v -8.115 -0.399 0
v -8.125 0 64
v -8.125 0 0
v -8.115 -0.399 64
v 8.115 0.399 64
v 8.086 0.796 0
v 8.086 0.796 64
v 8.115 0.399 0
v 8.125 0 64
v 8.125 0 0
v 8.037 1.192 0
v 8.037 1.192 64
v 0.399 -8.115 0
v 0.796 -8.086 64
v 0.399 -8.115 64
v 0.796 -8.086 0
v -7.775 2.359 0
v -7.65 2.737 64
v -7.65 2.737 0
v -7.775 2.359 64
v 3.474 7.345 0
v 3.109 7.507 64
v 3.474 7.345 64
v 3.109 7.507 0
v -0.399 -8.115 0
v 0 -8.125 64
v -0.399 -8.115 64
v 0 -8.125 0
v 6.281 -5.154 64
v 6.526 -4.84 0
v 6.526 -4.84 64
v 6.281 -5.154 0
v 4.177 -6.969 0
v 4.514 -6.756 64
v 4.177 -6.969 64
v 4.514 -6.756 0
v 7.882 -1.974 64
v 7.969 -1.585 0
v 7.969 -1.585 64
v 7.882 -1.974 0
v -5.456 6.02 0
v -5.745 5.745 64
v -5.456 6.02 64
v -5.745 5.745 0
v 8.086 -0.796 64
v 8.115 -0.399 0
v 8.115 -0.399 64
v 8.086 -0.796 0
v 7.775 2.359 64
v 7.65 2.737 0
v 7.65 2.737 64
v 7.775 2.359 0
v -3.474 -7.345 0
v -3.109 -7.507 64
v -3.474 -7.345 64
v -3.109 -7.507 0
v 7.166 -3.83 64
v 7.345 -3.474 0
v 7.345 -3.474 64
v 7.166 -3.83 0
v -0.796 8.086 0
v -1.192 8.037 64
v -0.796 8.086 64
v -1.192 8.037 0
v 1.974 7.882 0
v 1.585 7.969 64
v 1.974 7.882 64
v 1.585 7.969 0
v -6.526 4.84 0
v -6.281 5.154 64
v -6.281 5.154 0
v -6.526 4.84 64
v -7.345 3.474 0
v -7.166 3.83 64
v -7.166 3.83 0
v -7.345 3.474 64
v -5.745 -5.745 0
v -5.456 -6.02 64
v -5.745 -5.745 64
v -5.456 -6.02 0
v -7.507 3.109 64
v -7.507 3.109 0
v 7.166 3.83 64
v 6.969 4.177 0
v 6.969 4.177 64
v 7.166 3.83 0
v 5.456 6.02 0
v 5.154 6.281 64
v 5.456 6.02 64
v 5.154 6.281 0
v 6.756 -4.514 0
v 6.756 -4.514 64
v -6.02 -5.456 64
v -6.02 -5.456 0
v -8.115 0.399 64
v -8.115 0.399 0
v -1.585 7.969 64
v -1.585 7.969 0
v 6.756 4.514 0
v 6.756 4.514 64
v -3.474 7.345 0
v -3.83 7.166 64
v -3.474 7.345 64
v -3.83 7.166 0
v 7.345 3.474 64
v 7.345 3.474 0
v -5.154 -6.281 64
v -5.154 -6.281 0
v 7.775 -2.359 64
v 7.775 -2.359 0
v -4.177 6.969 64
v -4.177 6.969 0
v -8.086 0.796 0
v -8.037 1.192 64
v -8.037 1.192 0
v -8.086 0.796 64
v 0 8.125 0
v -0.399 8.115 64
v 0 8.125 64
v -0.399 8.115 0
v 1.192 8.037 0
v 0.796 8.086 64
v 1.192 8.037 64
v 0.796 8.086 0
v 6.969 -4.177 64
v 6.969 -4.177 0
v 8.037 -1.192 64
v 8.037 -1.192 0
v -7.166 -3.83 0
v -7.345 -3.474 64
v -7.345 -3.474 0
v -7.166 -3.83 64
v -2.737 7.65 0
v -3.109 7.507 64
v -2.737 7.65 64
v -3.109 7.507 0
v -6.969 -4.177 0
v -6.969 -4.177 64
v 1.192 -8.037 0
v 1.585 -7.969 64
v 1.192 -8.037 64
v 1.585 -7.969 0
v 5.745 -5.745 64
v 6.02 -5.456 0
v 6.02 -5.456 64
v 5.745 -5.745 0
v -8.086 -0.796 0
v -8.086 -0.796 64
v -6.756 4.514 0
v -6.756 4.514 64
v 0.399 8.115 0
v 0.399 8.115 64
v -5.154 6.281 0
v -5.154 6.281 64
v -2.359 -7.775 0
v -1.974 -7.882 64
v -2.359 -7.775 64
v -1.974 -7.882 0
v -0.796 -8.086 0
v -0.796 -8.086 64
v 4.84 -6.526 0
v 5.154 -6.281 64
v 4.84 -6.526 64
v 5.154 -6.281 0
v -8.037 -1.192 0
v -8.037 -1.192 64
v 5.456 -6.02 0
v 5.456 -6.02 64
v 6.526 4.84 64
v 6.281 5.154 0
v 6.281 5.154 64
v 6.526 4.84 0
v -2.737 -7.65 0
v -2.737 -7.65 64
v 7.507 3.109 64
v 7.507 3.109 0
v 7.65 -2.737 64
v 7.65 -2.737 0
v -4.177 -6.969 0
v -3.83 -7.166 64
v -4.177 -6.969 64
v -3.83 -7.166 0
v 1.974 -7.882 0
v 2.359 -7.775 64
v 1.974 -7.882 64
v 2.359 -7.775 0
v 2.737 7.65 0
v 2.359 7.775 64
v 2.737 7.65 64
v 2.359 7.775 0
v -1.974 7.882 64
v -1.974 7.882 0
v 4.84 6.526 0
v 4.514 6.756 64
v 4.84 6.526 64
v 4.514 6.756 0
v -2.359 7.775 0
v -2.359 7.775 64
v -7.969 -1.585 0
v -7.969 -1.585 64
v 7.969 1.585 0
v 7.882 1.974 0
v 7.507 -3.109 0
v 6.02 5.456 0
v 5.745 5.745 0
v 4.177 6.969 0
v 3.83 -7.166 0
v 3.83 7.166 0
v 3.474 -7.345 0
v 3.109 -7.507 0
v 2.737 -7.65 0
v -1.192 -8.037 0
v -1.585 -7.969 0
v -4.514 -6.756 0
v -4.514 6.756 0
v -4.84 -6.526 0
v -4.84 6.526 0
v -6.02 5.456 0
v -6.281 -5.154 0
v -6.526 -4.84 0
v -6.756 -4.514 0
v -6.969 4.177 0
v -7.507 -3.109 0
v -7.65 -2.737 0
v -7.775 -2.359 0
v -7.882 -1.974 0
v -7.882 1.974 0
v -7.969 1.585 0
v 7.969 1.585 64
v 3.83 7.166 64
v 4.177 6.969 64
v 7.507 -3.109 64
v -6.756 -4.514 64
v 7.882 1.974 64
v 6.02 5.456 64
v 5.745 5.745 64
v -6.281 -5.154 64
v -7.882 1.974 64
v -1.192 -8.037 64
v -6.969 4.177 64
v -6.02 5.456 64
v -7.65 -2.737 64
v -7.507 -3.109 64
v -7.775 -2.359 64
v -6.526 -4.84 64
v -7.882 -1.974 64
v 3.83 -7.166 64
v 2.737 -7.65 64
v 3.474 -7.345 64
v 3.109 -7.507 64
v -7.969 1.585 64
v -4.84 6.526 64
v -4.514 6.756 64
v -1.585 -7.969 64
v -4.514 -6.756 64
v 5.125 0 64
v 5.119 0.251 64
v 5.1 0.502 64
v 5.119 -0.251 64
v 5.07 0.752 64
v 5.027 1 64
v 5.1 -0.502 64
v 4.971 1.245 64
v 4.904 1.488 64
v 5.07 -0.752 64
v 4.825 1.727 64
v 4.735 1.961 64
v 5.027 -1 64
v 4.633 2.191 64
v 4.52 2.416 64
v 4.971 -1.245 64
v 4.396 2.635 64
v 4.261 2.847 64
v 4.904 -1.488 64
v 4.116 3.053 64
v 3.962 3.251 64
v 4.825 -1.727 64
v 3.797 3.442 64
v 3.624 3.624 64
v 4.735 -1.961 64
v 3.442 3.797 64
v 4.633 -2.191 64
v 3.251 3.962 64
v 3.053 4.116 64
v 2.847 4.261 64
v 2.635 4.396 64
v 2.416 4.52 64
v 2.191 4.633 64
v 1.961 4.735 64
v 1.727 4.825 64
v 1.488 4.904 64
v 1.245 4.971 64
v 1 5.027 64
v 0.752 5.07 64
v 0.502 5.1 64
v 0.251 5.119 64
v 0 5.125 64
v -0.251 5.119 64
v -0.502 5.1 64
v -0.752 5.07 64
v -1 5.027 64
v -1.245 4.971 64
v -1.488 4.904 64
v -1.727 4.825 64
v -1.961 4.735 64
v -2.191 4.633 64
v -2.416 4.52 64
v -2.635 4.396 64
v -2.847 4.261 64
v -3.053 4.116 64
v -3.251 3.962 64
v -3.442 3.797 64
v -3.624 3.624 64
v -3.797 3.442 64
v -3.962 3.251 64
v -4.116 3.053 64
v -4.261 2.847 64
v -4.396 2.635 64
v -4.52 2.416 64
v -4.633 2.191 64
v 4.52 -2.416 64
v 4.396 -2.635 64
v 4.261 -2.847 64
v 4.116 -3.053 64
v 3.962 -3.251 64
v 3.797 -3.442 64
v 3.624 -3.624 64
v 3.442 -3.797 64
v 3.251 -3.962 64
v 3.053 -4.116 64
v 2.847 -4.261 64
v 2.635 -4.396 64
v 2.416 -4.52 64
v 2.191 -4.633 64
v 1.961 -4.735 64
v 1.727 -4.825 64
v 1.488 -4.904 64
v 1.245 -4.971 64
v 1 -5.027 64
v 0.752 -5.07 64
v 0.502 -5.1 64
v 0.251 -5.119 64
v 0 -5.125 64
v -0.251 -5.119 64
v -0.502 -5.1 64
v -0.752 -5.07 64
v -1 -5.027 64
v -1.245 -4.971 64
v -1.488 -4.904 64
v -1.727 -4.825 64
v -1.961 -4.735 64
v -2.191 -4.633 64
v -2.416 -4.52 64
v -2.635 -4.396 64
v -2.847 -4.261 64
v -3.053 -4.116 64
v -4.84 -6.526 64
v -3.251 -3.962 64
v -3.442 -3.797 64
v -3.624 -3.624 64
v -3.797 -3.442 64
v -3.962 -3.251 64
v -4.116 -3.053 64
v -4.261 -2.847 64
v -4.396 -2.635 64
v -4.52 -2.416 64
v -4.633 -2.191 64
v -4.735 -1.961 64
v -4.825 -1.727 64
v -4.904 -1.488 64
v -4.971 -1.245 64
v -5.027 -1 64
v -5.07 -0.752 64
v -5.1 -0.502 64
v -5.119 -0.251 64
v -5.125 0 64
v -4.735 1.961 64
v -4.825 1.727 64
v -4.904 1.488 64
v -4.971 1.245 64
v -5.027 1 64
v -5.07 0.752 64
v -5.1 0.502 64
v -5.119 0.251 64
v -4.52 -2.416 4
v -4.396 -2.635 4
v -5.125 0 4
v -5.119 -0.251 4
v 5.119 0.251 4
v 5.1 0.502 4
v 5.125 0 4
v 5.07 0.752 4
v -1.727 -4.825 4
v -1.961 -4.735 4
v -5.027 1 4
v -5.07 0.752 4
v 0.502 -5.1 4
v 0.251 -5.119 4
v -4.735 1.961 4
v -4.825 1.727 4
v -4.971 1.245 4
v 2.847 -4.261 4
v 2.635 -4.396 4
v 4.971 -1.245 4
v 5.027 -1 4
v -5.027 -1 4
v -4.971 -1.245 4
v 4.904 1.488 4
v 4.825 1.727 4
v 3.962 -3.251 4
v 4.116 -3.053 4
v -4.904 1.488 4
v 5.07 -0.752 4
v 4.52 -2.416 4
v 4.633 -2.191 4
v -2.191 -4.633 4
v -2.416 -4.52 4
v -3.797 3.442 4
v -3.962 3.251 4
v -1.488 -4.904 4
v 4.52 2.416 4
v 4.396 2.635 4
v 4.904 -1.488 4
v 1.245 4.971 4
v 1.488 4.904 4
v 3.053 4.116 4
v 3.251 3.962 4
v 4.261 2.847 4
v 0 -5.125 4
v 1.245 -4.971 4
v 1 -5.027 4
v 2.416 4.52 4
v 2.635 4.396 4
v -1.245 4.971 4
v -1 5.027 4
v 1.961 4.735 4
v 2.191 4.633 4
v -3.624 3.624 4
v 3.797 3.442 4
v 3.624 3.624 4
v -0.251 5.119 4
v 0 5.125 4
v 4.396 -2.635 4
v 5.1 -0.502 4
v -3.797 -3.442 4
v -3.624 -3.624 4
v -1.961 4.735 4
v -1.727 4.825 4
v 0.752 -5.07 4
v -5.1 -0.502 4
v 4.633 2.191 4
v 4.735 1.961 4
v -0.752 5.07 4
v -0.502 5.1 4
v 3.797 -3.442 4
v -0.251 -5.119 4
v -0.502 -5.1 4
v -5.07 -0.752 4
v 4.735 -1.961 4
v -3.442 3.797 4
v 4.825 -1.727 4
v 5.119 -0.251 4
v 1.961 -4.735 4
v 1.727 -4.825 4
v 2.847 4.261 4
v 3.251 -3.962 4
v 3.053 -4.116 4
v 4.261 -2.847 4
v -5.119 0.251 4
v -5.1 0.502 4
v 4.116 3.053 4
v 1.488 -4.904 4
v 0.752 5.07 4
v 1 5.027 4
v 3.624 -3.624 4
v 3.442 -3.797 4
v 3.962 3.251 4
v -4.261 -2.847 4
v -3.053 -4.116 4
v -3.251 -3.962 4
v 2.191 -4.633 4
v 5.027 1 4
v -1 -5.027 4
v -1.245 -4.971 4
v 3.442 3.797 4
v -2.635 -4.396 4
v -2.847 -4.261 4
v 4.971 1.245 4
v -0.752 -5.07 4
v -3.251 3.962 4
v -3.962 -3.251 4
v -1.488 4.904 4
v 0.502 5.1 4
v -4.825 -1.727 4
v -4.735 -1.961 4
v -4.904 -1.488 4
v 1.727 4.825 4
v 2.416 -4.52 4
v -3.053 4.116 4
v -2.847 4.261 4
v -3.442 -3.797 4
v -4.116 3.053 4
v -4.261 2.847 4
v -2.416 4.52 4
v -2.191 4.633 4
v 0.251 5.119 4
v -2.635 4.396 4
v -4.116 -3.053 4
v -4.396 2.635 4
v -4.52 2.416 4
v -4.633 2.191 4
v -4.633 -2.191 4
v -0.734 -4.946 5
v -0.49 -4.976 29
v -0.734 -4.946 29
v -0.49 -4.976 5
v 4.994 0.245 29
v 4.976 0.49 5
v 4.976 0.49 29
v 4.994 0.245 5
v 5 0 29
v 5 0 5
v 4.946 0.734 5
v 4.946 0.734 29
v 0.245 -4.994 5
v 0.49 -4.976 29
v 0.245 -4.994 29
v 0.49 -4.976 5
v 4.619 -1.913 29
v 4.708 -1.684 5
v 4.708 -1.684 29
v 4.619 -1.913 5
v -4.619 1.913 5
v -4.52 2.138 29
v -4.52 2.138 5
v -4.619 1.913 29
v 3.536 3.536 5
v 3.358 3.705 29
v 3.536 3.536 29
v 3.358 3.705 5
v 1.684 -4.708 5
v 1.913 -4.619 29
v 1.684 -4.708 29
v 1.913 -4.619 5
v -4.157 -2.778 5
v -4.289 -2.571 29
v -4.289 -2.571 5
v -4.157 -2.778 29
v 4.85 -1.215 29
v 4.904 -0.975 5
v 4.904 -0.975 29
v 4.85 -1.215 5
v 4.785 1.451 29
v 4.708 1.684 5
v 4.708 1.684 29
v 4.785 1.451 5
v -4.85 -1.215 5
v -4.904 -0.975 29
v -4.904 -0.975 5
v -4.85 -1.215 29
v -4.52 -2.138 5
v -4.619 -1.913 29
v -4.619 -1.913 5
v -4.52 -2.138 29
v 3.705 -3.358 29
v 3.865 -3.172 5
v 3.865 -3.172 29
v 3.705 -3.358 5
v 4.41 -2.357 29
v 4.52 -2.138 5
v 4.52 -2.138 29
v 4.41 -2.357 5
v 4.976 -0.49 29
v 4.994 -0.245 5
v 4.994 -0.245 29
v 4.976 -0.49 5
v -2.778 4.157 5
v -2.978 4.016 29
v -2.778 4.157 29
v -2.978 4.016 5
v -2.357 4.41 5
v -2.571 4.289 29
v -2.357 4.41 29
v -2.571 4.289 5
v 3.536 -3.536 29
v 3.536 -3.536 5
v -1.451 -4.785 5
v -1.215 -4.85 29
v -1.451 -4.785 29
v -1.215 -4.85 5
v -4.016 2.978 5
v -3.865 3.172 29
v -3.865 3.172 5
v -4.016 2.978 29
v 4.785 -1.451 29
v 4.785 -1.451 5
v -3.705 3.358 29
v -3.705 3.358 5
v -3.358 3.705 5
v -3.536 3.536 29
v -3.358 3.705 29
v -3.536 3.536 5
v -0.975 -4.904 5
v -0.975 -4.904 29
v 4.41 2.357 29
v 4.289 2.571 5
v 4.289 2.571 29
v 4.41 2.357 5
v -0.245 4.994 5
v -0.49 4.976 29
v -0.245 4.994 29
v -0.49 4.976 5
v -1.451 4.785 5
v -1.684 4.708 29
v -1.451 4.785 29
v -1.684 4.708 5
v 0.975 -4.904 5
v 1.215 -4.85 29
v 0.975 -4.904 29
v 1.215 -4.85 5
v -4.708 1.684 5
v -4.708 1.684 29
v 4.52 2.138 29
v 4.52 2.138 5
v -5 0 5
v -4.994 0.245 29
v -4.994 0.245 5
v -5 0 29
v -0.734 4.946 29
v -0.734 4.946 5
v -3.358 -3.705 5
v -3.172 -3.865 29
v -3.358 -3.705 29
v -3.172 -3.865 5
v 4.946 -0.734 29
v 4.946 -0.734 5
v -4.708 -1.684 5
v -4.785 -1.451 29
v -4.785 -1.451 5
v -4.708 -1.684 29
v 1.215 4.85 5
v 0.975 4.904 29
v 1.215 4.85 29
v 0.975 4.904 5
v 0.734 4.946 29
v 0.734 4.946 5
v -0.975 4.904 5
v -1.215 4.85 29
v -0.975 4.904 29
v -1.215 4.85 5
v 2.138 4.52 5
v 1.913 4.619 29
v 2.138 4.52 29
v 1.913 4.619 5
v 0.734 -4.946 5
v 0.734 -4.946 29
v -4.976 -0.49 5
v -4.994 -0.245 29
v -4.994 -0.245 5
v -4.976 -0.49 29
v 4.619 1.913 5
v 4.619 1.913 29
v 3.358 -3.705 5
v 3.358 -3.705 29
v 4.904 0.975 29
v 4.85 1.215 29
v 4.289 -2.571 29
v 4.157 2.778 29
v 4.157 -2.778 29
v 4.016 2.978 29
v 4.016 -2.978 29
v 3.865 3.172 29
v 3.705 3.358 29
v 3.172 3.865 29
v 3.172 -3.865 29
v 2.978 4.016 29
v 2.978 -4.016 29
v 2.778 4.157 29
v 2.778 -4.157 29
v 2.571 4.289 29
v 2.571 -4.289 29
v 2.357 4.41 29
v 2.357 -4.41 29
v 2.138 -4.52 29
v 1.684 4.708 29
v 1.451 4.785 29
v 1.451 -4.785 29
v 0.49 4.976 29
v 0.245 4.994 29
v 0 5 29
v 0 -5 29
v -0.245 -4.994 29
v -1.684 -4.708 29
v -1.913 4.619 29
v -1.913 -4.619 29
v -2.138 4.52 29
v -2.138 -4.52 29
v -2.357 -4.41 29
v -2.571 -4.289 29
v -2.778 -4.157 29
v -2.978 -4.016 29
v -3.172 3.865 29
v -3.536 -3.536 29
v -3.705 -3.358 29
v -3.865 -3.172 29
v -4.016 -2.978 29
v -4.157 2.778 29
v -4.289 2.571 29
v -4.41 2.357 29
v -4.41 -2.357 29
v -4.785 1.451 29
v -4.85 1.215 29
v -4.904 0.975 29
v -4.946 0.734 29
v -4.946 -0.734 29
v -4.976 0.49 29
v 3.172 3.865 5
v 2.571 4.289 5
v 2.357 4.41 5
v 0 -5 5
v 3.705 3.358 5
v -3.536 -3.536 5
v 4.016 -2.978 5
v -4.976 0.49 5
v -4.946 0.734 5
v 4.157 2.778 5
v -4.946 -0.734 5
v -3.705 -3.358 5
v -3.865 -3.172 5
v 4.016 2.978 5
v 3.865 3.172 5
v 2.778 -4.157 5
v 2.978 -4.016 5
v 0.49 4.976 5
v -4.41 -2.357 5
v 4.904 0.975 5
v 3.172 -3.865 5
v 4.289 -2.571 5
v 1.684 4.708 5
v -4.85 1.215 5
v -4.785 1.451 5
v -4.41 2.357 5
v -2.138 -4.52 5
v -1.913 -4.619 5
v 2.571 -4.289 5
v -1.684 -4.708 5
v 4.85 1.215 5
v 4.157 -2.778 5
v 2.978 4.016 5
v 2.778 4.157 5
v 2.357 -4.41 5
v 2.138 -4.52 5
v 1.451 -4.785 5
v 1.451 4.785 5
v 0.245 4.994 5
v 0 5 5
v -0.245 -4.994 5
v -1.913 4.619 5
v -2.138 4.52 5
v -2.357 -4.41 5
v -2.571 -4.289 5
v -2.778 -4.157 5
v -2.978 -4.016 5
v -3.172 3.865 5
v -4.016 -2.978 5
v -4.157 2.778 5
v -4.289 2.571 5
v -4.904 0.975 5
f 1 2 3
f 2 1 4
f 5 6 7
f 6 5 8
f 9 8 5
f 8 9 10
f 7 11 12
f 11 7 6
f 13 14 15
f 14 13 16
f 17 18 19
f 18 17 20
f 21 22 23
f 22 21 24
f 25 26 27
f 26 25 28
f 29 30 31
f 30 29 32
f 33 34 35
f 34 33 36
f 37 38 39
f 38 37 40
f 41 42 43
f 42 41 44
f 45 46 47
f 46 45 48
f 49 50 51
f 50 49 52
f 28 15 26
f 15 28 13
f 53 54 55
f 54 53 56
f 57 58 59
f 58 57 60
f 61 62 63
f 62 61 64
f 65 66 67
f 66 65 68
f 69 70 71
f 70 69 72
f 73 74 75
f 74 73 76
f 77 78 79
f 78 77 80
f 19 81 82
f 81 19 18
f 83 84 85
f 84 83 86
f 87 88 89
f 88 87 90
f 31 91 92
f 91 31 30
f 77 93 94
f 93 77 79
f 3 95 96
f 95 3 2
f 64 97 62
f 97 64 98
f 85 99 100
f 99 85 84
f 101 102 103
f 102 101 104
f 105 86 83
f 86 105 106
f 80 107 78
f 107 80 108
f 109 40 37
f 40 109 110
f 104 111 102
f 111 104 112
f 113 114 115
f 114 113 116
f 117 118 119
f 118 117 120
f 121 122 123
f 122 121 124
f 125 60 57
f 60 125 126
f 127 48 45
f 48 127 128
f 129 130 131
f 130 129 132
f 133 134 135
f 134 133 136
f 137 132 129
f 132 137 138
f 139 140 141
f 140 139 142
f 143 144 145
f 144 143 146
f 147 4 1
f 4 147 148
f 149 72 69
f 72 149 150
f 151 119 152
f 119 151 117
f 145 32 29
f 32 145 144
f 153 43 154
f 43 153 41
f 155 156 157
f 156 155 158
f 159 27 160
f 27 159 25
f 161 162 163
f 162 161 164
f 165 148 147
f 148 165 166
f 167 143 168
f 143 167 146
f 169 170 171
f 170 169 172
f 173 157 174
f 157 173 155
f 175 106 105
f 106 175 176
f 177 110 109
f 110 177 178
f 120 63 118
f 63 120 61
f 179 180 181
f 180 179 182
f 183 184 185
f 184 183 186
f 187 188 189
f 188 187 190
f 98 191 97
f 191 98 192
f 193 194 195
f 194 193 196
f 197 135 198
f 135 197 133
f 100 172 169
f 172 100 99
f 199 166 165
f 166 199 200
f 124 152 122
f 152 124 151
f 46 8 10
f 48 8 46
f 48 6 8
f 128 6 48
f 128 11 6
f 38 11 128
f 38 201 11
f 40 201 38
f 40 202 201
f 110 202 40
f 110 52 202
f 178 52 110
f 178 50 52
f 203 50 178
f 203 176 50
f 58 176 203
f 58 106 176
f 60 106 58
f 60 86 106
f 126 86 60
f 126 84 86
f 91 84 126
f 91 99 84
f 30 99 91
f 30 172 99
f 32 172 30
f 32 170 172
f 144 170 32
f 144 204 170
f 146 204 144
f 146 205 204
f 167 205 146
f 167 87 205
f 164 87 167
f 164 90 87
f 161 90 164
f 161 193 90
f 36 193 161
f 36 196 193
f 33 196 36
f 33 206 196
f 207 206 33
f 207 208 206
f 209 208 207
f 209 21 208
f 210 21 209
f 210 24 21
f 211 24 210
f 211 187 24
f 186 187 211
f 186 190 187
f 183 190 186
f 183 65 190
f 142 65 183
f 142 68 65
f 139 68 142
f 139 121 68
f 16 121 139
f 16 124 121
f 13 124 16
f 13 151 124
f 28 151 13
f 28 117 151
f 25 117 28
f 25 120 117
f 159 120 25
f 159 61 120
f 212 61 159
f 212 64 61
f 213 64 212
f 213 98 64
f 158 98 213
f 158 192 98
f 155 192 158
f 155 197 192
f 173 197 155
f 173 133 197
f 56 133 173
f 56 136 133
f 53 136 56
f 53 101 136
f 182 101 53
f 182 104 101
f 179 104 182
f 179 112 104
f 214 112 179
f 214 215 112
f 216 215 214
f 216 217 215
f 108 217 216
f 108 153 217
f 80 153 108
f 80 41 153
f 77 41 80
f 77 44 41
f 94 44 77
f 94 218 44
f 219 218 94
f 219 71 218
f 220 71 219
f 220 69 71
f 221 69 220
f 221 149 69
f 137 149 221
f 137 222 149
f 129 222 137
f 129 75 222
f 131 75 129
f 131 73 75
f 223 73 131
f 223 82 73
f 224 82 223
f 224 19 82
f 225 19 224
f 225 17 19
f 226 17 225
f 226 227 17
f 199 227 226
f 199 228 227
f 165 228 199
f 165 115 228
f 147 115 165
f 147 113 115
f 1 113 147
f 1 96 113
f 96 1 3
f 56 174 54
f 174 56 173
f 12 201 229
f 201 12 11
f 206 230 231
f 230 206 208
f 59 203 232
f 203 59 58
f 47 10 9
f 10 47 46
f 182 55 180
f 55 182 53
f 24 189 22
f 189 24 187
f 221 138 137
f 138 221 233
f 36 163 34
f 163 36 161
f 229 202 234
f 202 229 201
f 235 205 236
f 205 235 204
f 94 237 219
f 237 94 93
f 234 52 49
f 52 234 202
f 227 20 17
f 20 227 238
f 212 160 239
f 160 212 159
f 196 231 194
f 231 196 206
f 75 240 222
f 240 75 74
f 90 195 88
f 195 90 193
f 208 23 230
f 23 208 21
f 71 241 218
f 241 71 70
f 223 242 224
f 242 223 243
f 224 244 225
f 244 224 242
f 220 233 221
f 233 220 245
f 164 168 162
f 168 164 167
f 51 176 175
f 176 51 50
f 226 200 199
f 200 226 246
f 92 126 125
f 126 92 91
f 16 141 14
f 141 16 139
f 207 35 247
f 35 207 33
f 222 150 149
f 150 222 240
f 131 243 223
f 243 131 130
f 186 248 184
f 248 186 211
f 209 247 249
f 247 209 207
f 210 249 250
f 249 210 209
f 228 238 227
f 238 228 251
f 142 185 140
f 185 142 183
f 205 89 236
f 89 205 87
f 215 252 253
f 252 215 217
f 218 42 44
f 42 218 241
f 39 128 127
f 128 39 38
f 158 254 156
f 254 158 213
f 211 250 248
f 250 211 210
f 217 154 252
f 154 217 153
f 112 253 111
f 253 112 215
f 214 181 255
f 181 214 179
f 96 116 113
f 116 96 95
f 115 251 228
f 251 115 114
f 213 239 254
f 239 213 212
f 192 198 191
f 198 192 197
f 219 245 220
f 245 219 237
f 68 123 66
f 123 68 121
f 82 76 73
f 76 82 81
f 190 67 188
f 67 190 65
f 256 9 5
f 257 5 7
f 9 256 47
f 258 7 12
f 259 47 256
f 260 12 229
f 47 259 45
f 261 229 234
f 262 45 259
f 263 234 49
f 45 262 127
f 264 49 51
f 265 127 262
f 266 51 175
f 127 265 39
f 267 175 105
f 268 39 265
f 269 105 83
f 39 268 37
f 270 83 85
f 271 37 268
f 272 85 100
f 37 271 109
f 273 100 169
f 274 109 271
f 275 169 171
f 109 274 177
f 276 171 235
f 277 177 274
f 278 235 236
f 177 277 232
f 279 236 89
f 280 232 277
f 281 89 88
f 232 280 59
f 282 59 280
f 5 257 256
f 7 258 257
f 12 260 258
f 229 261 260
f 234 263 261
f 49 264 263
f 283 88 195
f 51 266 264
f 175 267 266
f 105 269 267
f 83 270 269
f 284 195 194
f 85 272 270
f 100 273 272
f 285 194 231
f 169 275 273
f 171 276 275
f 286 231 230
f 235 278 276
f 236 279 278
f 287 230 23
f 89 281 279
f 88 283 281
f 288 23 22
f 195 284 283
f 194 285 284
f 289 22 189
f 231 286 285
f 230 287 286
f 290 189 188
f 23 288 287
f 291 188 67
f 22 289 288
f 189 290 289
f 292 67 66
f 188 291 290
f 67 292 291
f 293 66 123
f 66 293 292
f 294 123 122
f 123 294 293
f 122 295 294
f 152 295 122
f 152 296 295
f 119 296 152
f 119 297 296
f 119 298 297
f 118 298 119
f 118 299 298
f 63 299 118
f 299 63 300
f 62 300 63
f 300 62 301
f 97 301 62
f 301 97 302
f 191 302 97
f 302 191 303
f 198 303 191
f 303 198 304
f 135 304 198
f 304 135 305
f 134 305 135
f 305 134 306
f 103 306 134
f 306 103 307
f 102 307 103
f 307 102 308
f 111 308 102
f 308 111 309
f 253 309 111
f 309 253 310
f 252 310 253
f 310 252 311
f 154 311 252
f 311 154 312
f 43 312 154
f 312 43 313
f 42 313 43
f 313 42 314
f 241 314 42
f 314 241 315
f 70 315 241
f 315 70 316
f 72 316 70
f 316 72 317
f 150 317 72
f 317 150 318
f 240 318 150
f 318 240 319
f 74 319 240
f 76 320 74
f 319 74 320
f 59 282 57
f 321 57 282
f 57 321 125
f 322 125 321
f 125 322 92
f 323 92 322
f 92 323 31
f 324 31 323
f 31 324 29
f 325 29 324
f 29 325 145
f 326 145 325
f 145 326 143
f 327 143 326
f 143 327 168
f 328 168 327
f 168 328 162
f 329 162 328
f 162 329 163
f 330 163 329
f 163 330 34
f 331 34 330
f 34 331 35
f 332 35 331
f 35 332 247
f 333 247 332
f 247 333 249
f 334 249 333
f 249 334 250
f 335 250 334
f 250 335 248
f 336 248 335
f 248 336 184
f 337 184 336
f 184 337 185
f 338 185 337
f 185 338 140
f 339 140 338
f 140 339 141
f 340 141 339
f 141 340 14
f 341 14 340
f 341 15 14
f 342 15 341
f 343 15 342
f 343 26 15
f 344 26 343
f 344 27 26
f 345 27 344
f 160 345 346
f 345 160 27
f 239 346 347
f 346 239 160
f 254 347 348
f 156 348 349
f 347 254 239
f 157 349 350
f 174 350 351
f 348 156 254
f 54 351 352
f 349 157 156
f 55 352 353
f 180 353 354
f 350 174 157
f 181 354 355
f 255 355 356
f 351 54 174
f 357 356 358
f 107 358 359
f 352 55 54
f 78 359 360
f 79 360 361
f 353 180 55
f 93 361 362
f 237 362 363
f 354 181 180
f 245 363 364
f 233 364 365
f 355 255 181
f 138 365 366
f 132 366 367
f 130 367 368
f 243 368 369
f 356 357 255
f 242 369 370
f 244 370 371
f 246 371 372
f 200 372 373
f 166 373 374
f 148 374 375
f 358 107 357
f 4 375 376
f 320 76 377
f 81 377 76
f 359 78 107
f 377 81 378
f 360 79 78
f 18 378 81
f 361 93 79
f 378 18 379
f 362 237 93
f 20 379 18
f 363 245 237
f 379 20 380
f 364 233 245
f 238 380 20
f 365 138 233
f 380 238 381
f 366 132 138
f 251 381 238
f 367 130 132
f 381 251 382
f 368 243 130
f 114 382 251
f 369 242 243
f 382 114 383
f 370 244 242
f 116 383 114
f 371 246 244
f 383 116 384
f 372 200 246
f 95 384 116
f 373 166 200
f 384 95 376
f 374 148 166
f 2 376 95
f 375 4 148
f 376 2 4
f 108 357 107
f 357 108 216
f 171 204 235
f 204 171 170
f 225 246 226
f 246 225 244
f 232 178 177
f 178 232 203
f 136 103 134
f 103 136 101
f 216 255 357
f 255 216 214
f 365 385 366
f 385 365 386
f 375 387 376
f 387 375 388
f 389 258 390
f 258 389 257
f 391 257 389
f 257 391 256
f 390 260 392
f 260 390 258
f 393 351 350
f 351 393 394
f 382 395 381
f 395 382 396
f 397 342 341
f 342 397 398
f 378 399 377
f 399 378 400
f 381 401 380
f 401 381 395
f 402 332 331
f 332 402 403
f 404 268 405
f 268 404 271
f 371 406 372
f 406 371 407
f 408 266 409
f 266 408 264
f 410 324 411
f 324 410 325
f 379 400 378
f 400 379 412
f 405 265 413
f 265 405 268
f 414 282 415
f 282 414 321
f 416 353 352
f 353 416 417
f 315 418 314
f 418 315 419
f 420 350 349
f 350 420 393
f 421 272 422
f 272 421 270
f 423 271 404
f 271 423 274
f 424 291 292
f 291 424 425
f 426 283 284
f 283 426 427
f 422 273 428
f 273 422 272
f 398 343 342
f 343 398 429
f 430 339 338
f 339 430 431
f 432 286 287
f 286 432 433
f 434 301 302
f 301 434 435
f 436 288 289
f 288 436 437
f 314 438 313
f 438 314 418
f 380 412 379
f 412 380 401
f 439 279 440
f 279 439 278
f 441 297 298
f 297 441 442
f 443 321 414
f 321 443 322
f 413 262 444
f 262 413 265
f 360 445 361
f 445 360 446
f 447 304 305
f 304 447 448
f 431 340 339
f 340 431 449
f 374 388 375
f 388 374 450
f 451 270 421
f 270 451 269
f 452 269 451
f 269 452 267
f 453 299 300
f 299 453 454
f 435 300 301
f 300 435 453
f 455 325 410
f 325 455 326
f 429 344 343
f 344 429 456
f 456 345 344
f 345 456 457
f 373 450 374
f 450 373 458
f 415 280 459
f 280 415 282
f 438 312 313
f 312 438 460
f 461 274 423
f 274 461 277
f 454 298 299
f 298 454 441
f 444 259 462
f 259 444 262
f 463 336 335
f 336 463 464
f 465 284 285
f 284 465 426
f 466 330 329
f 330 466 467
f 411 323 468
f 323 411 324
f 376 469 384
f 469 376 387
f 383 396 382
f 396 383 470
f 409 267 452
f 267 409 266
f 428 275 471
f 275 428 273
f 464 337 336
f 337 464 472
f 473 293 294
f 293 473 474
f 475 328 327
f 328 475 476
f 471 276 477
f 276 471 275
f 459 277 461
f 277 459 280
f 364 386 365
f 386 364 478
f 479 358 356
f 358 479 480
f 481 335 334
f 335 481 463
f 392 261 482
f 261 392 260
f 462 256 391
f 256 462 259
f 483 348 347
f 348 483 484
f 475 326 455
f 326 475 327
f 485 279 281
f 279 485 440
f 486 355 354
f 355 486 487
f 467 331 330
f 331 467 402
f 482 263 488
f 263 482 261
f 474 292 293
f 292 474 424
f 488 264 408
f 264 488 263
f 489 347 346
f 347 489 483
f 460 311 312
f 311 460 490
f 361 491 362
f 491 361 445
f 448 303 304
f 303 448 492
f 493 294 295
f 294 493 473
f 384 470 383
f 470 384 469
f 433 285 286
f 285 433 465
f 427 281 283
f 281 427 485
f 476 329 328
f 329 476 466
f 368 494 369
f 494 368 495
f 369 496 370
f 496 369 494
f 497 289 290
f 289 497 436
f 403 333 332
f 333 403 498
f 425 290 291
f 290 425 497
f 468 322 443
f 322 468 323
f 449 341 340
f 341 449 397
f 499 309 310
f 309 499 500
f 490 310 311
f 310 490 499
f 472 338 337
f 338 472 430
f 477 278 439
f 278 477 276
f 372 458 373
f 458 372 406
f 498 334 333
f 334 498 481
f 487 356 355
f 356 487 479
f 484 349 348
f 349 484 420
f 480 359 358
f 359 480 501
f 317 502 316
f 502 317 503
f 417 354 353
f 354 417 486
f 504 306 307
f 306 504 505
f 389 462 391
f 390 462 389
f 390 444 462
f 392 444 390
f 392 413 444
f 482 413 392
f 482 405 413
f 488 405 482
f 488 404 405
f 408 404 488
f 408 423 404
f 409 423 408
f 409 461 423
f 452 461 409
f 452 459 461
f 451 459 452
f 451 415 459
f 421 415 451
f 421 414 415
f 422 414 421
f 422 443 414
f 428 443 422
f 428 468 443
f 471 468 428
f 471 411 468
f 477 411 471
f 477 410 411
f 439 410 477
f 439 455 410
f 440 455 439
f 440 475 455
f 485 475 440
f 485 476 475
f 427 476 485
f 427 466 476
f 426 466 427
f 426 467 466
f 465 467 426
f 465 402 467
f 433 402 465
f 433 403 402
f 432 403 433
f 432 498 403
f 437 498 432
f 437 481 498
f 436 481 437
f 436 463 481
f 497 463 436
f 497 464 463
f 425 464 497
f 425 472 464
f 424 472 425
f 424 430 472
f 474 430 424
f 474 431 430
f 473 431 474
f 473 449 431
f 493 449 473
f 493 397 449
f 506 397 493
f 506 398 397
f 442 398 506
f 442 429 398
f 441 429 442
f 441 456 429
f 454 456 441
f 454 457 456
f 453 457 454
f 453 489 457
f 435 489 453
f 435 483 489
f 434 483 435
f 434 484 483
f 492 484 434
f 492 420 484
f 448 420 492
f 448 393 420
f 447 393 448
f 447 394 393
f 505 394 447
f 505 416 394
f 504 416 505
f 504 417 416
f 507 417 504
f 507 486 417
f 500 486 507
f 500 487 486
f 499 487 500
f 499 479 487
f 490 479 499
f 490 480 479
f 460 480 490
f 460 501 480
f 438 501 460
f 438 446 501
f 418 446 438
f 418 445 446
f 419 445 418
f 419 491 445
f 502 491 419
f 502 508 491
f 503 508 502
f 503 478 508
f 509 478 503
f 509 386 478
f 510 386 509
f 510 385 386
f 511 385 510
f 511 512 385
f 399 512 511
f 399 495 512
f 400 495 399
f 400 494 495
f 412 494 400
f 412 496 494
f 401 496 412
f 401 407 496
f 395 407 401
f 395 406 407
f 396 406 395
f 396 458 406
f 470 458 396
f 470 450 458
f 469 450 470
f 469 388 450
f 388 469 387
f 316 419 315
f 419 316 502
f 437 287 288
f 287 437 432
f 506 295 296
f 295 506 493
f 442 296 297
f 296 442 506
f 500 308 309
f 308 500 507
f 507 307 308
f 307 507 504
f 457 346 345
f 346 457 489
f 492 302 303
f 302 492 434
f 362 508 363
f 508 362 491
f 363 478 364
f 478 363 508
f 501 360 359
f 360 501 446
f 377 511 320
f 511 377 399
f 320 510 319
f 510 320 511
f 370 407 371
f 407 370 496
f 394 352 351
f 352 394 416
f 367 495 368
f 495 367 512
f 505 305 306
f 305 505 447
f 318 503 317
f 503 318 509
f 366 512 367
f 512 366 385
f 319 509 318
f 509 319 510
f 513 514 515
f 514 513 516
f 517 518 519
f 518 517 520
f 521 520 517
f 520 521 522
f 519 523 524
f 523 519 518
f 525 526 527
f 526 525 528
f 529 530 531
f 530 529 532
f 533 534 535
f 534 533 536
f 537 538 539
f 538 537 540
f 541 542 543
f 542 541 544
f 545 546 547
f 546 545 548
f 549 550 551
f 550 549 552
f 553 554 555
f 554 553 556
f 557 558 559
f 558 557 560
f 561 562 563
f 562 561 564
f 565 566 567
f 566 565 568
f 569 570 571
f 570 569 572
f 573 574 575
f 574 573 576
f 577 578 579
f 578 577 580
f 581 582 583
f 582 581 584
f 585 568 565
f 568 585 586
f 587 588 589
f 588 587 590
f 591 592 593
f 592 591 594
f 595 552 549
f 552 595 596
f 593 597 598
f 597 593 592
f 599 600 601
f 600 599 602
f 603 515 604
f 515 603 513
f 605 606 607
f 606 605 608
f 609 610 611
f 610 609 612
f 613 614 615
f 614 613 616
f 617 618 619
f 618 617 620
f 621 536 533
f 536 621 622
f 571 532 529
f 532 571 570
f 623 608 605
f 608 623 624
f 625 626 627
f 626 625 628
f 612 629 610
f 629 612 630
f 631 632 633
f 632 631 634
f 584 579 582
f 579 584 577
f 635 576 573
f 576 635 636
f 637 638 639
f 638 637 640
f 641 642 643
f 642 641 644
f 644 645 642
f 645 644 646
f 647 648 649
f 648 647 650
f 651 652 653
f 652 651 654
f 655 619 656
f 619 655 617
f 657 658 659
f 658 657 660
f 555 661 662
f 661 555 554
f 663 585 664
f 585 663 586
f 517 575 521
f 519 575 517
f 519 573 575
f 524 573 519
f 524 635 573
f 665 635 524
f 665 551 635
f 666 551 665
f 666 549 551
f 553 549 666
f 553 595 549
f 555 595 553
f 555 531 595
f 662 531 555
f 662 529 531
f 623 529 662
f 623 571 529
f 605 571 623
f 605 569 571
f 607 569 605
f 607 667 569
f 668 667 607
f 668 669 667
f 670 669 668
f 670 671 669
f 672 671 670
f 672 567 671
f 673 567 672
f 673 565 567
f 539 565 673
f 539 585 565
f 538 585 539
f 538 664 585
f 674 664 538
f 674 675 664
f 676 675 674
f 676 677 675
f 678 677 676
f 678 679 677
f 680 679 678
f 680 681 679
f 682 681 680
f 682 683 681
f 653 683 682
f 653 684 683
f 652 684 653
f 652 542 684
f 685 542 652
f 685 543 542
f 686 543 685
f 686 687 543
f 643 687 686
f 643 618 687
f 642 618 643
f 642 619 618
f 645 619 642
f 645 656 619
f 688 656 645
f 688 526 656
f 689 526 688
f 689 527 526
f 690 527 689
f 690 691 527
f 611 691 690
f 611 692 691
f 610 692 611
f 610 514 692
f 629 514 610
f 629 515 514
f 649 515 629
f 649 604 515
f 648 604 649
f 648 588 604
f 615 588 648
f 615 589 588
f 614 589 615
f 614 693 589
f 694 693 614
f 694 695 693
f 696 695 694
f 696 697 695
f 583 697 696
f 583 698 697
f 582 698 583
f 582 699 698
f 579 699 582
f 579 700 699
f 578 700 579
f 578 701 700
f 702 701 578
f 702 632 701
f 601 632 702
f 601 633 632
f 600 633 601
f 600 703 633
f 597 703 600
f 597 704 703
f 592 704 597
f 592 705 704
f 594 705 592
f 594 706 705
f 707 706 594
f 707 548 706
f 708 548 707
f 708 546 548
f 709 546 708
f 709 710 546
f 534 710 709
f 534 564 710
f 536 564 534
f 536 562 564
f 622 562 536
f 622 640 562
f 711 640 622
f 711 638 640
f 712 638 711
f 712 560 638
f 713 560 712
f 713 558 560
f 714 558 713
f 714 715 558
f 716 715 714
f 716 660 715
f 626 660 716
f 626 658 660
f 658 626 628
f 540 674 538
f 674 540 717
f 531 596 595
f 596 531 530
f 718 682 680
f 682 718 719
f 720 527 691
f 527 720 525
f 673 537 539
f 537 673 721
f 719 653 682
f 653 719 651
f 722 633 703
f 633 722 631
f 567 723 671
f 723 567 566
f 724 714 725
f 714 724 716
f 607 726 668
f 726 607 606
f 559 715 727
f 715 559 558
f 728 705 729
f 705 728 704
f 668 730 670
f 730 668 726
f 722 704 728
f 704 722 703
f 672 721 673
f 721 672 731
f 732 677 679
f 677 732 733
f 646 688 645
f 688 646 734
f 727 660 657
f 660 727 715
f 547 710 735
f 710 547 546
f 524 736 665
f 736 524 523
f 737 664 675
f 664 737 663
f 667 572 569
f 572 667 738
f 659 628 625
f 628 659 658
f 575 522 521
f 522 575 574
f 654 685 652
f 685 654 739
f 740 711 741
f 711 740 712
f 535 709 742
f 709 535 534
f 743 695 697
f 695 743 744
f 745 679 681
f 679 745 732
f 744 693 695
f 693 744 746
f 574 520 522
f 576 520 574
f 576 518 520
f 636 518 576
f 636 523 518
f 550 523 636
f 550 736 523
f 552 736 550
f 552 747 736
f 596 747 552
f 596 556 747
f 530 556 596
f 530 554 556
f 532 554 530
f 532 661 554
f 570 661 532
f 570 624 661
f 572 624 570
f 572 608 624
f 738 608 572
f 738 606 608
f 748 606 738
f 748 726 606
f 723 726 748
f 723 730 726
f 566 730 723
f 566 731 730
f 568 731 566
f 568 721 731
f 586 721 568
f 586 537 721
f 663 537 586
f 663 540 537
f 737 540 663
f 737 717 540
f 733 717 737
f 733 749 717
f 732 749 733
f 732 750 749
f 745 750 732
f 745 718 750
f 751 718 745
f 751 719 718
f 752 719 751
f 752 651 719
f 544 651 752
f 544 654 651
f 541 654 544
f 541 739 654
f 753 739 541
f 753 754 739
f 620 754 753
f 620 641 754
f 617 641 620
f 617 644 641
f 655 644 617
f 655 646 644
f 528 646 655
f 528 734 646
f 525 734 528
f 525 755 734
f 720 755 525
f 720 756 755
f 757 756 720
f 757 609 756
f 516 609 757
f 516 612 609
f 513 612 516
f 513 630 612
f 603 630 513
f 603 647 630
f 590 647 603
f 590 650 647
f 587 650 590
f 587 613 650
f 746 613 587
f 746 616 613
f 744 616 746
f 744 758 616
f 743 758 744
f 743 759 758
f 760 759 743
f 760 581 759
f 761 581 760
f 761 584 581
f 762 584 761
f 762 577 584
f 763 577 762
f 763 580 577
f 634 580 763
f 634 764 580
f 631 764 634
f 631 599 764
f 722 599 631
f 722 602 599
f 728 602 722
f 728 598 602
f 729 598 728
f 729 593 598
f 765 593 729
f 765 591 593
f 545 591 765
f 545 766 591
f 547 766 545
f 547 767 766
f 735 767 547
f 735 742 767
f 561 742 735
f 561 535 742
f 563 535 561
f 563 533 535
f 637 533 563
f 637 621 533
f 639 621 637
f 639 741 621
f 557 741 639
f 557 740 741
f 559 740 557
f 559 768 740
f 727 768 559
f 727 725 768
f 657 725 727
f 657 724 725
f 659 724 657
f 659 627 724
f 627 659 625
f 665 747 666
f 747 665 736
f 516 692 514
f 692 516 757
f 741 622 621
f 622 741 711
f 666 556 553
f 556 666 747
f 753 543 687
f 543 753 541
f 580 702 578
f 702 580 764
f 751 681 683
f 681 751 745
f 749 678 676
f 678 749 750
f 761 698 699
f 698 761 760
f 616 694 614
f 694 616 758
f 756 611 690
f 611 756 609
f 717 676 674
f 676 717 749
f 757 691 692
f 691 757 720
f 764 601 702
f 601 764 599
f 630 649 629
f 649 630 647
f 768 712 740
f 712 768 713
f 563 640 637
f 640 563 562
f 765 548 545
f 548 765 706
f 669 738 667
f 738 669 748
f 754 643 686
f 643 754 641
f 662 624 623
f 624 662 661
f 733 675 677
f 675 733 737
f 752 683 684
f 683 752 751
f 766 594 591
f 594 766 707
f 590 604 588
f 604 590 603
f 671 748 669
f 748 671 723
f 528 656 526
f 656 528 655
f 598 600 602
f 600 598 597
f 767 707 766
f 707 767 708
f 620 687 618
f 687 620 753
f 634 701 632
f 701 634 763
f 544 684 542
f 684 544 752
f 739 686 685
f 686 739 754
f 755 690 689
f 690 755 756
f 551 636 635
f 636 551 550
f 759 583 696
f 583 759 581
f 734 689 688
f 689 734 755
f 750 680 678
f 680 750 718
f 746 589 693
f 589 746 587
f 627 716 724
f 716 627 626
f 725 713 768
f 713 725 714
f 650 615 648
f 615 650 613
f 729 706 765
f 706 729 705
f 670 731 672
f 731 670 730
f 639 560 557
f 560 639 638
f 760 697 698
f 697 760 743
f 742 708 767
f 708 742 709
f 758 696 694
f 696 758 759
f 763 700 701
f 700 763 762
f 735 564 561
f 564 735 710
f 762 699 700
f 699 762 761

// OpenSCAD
agentscad_part = "all";
piston_stroke = 0;

piston_d = 10;
diam_clearance = 0.25;
bore_d = piston_d + diam_clearance;

barrel_wall = 3;
barrel_bottom_t = 4;
barrel_inner_height = 60;
barrel_outer_d = bore_d + 2 * barrel_wall;
barrel_outer_h = barrel_bottom_t + barrel_inner_height;

piston_length = 24;
piston_base_z = barrel_bottom_t + 1;

module barrel() {
    difference() {
        cylinder(h = barrel_outer_h, d = barrel_outer_d, center = false, $fn = 128);
        translate([0, 0, barrel_bottom_t])
            cylinder(h = barrel_inner_height + 1, d = bore_d, center = false, $fn = 128);
    }
}

module piston() {
    translate([0, 0, piston_base_z + piston_stroke])
        cylinder(h = piston_length, d = piston_d, center = false, $fn = 128);
}

if (agentscad_part == "all" || agentscad_part == "barrel") barrel();
if (agentscad_part == "all" || agentscad_part == "piston") piston();
